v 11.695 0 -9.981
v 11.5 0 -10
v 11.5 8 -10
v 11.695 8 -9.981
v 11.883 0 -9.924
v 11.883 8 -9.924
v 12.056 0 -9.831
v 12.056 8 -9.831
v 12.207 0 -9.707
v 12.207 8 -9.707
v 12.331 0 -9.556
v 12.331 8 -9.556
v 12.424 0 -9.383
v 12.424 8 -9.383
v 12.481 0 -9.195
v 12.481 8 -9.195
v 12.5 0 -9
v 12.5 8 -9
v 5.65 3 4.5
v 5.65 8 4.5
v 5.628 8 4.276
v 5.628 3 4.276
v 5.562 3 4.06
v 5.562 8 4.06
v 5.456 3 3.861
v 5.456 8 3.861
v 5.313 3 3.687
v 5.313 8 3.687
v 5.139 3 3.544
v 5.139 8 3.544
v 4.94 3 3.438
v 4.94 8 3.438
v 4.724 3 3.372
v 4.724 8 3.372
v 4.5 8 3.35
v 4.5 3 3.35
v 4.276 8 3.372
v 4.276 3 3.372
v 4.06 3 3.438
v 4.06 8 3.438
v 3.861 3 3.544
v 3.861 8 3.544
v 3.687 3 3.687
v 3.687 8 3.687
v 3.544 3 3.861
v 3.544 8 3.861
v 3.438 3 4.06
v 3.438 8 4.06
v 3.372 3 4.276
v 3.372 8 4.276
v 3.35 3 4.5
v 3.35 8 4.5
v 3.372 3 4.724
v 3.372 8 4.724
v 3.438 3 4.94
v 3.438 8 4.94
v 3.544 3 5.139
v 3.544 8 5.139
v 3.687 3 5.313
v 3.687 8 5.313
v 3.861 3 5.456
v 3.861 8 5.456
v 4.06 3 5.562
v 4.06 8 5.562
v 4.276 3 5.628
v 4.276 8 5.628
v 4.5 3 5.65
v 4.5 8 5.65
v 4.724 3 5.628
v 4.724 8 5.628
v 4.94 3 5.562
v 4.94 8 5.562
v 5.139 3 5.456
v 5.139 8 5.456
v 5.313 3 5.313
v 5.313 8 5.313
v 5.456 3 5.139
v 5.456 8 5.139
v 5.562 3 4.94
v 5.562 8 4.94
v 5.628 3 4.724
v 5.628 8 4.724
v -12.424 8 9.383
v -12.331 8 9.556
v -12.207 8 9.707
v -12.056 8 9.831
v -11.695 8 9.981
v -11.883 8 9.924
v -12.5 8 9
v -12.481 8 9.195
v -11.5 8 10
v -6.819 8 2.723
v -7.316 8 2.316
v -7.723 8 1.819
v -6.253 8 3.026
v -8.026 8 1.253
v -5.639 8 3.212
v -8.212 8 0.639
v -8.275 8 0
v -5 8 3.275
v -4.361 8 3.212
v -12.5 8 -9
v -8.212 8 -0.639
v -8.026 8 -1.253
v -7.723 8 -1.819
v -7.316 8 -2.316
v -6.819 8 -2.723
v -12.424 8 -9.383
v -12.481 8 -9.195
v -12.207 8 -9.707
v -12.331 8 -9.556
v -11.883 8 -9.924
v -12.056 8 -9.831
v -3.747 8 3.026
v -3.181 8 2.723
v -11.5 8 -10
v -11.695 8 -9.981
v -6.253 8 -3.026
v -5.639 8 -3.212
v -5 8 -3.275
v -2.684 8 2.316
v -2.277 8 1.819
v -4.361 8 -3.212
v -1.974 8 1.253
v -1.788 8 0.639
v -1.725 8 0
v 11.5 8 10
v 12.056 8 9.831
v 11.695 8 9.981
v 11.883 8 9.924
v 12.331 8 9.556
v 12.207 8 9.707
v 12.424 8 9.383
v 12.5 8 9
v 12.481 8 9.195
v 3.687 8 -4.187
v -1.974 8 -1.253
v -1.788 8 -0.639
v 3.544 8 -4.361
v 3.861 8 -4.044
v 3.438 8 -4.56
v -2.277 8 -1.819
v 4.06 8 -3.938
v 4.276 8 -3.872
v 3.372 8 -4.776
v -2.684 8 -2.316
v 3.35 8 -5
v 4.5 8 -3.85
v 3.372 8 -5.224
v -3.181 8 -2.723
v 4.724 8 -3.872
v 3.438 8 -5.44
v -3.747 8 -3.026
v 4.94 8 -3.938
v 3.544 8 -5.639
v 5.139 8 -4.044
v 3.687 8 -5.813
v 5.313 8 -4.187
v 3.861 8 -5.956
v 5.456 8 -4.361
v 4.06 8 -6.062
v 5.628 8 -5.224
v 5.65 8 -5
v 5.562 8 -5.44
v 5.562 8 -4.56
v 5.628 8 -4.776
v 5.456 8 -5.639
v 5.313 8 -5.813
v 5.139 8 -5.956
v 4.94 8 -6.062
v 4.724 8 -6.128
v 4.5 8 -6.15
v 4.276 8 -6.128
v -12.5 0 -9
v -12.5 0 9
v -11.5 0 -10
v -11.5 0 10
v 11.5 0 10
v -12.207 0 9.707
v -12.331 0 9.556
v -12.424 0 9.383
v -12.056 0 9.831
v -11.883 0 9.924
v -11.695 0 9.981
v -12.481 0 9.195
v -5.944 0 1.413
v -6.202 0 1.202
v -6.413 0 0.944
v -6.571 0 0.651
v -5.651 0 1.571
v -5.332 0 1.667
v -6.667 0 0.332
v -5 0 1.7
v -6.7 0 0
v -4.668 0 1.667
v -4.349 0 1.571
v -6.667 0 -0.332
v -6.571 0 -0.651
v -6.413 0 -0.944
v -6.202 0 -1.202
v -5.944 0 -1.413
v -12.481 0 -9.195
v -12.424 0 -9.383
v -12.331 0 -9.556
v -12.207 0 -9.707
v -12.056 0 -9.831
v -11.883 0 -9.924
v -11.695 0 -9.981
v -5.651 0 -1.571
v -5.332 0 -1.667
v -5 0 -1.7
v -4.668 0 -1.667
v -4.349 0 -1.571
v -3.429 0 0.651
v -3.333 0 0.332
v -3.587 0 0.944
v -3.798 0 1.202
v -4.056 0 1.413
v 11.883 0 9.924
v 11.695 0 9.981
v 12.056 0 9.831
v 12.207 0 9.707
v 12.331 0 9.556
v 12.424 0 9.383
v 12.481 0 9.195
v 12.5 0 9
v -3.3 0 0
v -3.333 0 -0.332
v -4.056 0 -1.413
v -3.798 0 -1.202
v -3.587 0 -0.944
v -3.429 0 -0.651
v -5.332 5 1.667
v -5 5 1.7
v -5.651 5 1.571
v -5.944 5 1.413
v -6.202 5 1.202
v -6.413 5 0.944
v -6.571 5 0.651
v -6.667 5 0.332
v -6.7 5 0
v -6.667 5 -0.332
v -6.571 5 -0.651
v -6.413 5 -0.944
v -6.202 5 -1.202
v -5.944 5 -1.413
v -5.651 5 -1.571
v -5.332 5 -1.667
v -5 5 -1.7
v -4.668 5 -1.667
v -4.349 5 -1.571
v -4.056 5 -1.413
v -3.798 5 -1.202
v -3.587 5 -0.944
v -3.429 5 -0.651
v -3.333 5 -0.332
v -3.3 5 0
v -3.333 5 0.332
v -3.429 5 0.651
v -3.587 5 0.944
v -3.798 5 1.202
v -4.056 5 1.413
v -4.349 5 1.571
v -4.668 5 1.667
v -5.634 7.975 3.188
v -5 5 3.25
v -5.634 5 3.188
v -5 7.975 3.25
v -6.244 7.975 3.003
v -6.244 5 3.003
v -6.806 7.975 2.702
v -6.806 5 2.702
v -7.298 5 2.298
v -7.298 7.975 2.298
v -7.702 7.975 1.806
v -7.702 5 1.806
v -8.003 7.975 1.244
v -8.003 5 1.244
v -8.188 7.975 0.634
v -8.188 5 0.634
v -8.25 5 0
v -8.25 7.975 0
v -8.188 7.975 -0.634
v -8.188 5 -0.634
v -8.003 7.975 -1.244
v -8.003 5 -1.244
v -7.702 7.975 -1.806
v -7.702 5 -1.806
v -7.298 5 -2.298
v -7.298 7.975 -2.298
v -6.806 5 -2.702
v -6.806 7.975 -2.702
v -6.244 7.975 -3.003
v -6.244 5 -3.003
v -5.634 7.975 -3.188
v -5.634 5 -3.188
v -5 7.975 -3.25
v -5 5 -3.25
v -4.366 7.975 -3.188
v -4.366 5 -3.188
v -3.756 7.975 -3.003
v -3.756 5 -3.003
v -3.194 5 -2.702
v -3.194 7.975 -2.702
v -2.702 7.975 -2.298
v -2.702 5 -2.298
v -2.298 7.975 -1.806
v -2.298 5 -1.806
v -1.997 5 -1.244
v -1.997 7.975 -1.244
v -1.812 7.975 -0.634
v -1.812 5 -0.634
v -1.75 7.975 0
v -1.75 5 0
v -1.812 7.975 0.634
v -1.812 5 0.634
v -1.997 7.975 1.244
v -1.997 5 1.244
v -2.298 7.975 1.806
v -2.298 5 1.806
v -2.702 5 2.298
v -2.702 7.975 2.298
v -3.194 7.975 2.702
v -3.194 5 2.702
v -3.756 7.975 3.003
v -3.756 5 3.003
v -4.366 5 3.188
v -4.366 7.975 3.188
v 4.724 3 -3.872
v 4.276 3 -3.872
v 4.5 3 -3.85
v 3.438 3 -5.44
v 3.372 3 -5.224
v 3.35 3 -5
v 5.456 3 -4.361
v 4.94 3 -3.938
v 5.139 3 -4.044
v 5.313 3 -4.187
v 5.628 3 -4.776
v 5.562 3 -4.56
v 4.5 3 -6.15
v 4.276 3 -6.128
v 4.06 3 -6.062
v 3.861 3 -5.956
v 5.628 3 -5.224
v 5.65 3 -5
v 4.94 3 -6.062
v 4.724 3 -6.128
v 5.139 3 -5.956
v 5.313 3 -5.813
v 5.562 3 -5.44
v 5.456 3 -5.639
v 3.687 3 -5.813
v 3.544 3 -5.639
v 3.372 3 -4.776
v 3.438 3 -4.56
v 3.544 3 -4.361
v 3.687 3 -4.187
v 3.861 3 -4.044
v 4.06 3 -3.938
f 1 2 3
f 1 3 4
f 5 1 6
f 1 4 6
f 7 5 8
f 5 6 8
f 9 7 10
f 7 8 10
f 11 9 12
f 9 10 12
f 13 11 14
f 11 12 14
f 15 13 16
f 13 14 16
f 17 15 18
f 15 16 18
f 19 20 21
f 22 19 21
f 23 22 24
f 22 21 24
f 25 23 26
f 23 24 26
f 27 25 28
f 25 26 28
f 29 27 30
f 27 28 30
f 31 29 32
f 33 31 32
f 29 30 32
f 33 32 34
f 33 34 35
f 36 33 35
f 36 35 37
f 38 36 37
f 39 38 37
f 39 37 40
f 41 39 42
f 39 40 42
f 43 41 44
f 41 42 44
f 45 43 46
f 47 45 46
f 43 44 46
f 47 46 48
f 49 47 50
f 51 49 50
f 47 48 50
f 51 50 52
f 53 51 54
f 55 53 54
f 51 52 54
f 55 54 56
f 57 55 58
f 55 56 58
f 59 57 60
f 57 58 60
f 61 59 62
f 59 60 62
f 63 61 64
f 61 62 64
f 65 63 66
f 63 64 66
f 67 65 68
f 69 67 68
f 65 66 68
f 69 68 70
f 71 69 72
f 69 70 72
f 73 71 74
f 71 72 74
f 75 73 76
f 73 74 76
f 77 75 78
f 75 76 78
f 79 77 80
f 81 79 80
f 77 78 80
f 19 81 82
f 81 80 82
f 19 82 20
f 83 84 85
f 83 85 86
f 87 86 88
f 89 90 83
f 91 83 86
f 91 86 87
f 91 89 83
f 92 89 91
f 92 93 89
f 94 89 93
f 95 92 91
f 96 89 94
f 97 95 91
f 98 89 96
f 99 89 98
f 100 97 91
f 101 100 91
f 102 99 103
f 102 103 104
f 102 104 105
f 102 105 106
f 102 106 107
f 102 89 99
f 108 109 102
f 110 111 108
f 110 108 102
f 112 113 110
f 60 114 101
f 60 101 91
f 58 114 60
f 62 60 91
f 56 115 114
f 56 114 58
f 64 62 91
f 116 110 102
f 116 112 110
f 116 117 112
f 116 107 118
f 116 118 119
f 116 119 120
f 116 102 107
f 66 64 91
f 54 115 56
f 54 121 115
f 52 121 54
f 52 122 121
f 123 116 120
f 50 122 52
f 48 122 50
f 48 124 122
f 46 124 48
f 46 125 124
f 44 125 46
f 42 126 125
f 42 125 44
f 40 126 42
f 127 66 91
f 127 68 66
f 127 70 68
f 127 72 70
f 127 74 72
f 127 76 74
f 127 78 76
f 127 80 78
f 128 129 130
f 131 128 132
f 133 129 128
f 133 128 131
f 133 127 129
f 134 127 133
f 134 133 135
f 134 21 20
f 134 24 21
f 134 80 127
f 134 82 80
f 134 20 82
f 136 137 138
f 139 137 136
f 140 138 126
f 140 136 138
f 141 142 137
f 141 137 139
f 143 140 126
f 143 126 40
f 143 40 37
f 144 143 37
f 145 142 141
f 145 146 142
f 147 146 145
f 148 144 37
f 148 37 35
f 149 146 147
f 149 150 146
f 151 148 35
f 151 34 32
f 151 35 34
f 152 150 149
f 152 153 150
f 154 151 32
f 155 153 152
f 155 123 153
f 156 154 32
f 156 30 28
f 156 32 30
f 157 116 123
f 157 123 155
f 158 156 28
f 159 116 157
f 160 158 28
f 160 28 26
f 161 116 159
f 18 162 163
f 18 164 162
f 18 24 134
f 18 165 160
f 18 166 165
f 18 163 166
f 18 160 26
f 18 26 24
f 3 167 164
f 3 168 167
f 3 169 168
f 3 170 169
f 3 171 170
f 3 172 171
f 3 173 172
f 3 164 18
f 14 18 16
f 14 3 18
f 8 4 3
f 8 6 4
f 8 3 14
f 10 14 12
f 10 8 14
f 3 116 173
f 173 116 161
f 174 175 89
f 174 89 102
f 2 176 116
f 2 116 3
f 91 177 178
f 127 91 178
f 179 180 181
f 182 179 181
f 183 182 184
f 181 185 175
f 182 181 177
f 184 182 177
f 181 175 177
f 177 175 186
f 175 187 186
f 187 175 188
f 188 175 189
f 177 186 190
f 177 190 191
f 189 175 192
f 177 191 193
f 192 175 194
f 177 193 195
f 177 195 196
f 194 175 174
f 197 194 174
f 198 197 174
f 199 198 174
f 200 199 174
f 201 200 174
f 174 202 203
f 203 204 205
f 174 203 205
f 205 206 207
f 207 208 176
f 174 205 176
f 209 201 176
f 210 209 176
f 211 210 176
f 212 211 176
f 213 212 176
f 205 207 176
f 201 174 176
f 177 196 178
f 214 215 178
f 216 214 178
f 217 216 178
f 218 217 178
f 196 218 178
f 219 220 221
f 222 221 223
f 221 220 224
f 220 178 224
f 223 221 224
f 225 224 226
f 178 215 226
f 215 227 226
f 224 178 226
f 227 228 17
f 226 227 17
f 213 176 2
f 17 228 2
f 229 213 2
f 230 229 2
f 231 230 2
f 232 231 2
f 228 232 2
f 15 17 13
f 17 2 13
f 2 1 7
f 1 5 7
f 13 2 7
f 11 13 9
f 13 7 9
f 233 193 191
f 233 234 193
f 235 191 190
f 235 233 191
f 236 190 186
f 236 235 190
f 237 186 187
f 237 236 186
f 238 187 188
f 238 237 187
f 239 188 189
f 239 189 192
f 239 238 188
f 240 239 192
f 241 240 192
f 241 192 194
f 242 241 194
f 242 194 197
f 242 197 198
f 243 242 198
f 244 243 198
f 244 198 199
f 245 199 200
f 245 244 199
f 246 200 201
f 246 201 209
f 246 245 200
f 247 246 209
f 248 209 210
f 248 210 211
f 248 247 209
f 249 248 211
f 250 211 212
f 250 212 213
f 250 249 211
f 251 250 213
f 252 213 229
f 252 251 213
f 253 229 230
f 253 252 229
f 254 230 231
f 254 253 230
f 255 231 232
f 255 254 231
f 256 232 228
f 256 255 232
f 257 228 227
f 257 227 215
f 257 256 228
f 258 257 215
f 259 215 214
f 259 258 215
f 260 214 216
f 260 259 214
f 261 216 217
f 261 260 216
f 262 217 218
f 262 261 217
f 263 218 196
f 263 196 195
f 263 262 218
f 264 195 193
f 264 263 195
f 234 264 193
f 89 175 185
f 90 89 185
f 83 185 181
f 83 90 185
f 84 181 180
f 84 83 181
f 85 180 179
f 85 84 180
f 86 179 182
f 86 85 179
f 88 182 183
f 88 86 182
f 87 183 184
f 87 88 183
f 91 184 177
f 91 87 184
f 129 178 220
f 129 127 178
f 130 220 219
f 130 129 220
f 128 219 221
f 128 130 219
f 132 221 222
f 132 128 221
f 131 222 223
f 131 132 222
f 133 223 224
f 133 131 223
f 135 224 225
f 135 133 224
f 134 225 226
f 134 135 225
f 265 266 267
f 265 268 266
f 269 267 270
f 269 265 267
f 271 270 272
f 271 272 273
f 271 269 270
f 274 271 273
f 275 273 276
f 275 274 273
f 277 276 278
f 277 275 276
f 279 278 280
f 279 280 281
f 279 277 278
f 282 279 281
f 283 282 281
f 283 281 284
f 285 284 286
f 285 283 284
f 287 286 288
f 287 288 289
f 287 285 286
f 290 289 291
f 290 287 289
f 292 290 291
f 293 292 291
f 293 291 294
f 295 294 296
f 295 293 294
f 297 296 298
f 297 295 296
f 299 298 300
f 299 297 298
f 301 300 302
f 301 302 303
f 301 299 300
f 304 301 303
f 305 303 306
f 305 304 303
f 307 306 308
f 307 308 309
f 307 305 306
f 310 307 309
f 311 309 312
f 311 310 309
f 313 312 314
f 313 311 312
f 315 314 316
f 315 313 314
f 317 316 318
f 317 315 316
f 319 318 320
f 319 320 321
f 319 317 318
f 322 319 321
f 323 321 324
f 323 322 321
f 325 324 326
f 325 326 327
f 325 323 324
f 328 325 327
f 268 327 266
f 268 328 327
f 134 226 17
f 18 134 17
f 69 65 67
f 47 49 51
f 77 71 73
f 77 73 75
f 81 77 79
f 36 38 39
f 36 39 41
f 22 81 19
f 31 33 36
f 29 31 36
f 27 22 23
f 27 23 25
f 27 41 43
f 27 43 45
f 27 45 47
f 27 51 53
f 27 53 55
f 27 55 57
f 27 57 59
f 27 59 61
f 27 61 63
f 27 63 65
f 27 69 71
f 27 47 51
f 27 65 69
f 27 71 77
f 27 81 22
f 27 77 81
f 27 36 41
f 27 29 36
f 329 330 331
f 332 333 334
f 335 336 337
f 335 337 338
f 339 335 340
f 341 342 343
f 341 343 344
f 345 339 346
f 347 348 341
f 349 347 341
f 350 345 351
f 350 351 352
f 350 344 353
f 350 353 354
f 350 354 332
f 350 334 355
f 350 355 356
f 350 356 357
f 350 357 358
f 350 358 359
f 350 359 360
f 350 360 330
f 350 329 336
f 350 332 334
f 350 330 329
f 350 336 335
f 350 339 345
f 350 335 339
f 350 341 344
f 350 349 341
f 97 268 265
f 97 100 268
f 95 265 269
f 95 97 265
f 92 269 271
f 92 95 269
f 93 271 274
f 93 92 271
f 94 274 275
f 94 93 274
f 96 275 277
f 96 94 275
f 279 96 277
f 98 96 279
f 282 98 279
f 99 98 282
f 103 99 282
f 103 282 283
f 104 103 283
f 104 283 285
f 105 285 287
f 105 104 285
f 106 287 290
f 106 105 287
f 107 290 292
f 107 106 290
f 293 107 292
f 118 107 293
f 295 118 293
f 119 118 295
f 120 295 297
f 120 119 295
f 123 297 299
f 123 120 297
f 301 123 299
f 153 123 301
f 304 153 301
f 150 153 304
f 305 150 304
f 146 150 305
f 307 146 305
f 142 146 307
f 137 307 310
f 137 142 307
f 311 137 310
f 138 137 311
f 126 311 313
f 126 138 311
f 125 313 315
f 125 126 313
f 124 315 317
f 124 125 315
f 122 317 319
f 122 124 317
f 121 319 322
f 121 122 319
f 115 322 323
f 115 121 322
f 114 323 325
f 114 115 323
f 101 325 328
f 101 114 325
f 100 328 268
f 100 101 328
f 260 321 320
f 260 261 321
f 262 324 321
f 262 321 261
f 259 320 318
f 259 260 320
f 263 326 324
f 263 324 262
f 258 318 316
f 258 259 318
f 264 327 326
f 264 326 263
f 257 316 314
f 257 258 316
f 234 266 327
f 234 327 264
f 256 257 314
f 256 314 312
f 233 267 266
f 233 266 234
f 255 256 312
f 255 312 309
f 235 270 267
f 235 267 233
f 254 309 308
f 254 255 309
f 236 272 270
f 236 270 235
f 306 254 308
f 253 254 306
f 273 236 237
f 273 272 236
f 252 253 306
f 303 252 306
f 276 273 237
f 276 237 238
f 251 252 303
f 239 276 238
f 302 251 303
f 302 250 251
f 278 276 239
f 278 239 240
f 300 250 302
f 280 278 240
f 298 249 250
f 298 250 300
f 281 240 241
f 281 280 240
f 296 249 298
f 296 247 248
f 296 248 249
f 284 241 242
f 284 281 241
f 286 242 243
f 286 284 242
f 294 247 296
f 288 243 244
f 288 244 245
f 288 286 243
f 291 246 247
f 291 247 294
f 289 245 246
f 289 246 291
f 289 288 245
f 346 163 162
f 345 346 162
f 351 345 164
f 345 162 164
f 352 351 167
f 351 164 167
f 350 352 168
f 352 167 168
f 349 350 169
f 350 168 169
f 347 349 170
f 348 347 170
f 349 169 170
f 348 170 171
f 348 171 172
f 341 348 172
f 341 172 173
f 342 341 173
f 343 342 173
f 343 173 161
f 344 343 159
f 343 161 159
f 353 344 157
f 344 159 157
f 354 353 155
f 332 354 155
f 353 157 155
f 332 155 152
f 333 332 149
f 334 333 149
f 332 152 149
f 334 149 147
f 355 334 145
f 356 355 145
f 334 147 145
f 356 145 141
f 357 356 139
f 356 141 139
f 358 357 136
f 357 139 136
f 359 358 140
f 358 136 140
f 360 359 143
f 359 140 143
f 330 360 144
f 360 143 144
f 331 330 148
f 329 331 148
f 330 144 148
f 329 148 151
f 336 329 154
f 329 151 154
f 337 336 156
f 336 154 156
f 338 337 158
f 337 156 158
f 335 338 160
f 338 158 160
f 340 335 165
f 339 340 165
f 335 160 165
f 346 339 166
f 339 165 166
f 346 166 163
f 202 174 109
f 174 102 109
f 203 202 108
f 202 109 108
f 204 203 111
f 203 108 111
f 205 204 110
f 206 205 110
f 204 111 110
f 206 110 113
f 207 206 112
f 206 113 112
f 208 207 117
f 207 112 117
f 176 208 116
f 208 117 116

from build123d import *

# Parameters (mm, degrees)
SKETCH1_W           = 25
SKETCH1_H           = 20
BOSS_EXTRUDE1_DEPTH = 8
FILLET1_R           = 1
SKETCH5_R           = 1.15
CUT_EXTRUDE1_DEPTH  = 5


with BuildPart() as part:
    # Sketch1 → Boss-Extrude1 (new body)
    with BuildSketch(Plane(origin=(0, 0, 0), x_dir=(1, 0, 0), z_dir=(0, 1, 0))):
        Rectangle(SKETCH1_W, SKETCH1_H)
    extrude(amount=BOSS_EXTRUDE1_DEPTH)

    # Sketch4 → CBORE for M3 SHCS1 (revolve, cut)
    with BuildSketch(Plane(origin=(-5, 8, 0), x_dir=(0, 0, 1), z_dir=(1, 0, 0))):
        Polygon((0, 0), (0, 8), (1.7, 8), (1.7, 3), (3.25, 3), (3.25, 0.025), (3.275, 0), align=None)
    revolve(axis=Axis((-5, 14.35, 0), (0, -1, 0)), mode=Mode.SUBTRACT)

    # Fillet1
    fillet1_edges = [part.edges().sort_by_distance(p)[0] for p in [
        (-12.5, 4, -10),
        (12.5, 4, -10),
        (12.5, 4, 10),
        (-12.5, 4, 10),
    ]]
    fillet(fillet1_edges, radius=FILLET1_R)

    # Sketch5 → Cut-Extrude1 (cut)
    with BuildSketch(Plane(origin=(0, 8, 0), x_dir=(1, 0, 0), z_dir=(0, 1, 0))):
        with Locations((4.5, 5)):
            Circle(SKETCH5_R)
        with Locations((4.5, -4.5)):
            Circle(SKETCH5_R)
    extrude(amount=-CUT_EXTRUDE1_DEPTH, mode=Mode.SUBTRACT)


solid = part.part
